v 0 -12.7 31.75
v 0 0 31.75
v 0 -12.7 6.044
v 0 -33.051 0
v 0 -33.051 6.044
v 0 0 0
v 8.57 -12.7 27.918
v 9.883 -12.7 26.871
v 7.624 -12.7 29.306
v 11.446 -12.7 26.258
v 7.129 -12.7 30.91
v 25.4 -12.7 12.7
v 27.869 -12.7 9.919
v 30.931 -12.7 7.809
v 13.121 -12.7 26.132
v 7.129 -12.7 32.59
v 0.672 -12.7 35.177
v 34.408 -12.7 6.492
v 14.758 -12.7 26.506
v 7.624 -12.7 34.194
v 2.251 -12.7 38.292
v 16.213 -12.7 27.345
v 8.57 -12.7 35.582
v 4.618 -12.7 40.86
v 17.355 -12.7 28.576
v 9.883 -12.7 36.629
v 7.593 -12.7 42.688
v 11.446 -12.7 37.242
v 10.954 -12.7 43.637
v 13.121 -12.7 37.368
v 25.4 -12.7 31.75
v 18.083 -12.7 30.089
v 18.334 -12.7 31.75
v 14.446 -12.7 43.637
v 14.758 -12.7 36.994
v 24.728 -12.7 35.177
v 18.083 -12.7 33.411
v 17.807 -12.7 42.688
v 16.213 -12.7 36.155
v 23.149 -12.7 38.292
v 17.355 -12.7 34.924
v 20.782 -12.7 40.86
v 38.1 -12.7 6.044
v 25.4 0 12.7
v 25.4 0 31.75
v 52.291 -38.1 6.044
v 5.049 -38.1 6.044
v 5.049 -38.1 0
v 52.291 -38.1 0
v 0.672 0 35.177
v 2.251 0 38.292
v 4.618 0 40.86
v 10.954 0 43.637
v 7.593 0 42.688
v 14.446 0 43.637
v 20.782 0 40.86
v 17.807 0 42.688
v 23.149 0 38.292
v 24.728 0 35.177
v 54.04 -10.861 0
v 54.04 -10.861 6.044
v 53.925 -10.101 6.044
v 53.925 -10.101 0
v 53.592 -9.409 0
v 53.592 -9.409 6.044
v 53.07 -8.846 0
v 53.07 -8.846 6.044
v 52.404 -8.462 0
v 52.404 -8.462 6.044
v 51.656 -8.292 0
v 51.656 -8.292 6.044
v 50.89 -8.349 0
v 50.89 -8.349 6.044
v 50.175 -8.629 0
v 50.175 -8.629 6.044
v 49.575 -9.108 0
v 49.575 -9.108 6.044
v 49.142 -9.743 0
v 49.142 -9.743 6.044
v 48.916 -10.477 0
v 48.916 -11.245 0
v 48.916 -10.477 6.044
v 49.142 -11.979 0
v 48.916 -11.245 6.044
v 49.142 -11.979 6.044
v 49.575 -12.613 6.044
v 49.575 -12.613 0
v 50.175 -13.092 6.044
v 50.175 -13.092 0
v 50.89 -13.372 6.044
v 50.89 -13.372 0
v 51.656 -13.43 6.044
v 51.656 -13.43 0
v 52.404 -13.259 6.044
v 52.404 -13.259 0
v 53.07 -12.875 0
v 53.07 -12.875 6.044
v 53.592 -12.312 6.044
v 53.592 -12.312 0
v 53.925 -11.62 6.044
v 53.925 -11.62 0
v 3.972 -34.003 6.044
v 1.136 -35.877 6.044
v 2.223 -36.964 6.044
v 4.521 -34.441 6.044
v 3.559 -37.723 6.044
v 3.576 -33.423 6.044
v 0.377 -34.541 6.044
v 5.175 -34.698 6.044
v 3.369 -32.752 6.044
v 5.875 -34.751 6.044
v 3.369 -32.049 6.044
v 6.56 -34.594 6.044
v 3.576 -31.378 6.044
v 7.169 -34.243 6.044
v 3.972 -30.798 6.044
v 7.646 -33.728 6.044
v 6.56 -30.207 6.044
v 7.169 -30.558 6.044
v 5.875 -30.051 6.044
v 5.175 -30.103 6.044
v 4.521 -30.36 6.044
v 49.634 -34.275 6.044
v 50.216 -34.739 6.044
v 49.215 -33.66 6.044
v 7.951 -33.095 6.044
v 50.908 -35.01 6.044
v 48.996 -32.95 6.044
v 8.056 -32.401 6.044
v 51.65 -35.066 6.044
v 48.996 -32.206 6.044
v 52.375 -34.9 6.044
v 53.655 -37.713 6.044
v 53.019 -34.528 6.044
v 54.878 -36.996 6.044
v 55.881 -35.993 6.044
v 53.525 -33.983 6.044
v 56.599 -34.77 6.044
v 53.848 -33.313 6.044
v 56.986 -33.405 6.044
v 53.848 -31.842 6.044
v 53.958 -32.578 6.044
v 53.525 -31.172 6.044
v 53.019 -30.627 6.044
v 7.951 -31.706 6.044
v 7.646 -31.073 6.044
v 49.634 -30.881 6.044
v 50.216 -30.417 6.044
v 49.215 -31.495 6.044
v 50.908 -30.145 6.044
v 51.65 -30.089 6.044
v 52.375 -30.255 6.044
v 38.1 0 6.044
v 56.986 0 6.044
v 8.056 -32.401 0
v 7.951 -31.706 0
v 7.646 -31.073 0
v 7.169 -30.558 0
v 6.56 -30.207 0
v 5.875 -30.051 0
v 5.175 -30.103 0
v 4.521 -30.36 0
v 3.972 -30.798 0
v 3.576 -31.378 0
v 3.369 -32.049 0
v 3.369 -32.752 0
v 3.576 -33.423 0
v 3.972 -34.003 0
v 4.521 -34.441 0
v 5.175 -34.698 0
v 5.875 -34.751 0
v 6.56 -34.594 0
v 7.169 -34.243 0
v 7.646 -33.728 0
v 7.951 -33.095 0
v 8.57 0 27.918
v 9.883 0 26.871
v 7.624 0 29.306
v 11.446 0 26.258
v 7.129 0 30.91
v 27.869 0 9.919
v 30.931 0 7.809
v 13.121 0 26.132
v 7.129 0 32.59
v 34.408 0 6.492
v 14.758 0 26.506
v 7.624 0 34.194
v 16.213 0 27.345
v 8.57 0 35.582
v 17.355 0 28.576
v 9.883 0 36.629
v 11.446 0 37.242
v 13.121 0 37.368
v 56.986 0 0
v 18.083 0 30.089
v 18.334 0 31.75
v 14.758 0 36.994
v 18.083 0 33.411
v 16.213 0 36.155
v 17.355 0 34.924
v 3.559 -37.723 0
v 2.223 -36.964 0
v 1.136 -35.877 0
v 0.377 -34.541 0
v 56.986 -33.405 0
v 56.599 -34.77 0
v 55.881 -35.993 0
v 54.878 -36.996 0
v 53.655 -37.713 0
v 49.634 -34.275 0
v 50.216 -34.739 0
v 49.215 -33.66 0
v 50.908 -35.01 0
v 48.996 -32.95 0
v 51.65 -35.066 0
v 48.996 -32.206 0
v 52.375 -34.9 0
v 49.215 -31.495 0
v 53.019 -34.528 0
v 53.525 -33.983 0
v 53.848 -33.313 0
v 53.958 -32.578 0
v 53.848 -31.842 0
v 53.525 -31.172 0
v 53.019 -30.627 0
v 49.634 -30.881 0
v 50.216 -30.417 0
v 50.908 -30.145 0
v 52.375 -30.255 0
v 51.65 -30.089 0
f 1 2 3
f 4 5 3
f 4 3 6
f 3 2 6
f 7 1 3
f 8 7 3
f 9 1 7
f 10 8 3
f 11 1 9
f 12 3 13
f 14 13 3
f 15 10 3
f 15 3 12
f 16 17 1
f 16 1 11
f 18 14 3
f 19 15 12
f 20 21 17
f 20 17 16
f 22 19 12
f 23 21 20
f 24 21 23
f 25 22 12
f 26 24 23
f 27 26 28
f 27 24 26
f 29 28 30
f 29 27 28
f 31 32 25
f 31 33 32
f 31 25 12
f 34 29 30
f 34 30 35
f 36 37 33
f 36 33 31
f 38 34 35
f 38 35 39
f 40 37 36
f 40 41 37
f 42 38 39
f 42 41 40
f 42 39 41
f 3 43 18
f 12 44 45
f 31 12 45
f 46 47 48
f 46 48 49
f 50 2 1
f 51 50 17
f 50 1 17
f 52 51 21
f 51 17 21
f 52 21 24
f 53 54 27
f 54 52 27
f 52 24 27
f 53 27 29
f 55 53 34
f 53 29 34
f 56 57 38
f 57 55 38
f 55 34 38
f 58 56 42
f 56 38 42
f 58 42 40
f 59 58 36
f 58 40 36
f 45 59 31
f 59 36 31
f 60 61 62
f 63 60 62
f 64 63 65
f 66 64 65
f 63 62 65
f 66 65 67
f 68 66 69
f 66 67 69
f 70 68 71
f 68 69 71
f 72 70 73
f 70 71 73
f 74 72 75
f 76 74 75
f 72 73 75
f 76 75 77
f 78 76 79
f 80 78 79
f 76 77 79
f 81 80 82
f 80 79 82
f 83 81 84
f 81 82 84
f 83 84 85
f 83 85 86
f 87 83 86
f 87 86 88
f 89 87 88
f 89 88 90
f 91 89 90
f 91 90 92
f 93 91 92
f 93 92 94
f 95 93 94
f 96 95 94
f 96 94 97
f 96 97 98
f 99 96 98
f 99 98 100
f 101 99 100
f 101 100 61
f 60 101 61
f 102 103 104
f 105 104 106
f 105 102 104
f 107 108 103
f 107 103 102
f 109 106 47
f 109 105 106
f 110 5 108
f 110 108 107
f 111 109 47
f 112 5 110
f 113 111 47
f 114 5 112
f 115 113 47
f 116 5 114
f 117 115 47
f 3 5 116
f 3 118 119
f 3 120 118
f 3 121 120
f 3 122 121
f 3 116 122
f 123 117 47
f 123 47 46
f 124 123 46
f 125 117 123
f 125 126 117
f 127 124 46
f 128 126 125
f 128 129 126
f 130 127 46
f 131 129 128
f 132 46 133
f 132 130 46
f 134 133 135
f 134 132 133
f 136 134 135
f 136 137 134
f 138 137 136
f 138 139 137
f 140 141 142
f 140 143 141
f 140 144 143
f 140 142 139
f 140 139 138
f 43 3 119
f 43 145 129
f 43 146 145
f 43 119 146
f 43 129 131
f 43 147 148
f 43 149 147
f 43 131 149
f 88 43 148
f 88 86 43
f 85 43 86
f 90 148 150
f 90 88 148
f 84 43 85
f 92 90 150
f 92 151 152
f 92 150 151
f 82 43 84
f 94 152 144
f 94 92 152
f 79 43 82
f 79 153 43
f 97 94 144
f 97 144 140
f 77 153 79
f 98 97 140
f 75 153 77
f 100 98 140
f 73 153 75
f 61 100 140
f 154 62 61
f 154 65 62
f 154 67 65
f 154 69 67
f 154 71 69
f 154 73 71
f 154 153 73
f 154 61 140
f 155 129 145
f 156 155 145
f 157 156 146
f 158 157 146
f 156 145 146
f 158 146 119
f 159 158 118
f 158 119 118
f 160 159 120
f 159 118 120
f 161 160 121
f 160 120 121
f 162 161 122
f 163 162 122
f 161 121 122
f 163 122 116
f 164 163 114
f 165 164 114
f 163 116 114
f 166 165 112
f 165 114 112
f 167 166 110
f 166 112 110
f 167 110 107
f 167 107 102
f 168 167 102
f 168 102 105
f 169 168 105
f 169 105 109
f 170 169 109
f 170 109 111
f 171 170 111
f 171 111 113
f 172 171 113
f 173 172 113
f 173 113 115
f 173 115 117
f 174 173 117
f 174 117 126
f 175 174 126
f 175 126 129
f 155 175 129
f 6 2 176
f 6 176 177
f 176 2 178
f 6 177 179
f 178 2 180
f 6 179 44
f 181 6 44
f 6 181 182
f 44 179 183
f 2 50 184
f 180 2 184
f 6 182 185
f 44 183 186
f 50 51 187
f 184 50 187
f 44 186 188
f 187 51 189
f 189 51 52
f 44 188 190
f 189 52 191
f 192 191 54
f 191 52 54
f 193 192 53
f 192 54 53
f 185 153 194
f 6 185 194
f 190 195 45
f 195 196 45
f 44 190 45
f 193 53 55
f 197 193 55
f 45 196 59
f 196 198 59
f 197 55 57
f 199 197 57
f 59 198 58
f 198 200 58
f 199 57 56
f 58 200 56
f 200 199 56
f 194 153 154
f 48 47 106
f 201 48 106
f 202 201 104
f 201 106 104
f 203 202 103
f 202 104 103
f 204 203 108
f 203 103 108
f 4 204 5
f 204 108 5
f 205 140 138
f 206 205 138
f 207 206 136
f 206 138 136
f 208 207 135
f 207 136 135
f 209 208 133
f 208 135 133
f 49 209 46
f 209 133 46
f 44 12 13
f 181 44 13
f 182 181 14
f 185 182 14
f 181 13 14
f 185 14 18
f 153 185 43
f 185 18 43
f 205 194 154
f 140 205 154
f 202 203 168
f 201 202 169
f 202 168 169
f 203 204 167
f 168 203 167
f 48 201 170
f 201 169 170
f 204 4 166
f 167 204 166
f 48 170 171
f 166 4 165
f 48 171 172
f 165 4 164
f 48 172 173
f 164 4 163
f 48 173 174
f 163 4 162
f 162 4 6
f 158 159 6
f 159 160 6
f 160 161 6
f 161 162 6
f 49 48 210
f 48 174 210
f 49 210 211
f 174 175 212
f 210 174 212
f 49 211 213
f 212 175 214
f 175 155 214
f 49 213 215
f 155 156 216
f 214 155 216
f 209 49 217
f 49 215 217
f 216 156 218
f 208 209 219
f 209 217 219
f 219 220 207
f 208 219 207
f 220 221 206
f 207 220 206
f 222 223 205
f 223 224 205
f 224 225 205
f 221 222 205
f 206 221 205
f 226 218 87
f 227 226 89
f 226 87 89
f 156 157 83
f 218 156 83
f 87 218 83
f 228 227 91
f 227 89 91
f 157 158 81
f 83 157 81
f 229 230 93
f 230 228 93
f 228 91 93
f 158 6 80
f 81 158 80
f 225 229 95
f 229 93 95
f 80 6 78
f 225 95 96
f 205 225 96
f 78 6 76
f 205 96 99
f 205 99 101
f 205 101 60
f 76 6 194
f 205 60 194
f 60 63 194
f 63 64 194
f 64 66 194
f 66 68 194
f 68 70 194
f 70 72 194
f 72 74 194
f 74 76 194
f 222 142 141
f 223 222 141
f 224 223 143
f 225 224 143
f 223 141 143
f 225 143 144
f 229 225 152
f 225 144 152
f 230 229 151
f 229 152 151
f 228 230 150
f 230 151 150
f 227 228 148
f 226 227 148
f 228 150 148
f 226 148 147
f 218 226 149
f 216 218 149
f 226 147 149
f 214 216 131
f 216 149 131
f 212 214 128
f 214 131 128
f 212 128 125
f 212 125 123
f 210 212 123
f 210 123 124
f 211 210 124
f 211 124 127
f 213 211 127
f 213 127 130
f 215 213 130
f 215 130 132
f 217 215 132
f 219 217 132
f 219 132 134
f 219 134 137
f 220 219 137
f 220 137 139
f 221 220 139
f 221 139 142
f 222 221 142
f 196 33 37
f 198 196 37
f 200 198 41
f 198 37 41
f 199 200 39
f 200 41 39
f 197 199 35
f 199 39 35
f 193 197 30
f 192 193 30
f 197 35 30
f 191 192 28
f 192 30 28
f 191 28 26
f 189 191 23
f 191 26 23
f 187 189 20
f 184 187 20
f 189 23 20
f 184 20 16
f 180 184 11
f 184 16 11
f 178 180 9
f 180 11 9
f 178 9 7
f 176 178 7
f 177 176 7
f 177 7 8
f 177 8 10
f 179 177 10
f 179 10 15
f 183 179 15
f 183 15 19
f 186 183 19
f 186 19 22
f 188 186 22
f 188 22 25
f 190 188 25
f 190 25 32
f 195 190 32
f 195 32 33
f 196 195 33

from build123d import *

# Parameters (mm, degrees)
F0_W     = 56.9855384529
F0_H     = 6.0439207591
F1_DEPTH = 38.1
F3_DEPTH = 12.7
F4_R     = 5.6337267147
F5_DEPTH = 25.4
F6_R     = 2.5763739366
F6_R_2   = 2.4951731212
F6_R_3   = 2.3565031445
F7_DEPTH = 25.4


with BuildPart() as f1:
    # F0 (on Front) → F1 (new body)
    with BuildSketch(Plane.XZ):
        with Locations((28.4927692264, 3.0219603796)):
            Rectangle(F0_W, F0_H)
    extrude(amount=F1_DEPTH)

    # F2 (on Front) → F3 (join)
    with BuildSketch(Plane.XZ):
        Polygon((0, 44.45), (0, 0), (38.1, 0), (38.1, 12.7), (25.4, 12.7), (25.4, 44.45), align=None)
    extrude(amount=F3_DEPTH)

    # F4 (on face) → F5 (cut)
    with BuildSketch(Plane.XZ.offset(12.7)):
        with BuildLine():
            ThreePointArc((0, 31.75), (12.7, 43.757902847), (25.4, 31.75))
            Line((25.4, 31.75), (25.4, 44.45))
            Line((25.4, 44.45), (0, 44.45))
            Line((0, 44.45), (0, 31.75))
        make_face()
        with Locations((12.7, 31.75)):
            Circle(F4_R)
        with BuildLine():
            Line((38.1, 12.7), (25.4, 12.7))
            ThreePointArc((25.4, 12.7), (30.9307359014, 7.8087797629), (38.1, 6.0439207591))
            Line((38.1, 6.0439207591), (38.1, 12.7))
        make_face()
    extrude(amount=-F5_DEPTH, mode=Mode.SUBTRACT)

    # F6 (on face) → F7 (cut)
    with BuildSketch(Plane.XY.offset(6.0439207591)):
        with BuildLine():
            ThreePointArc((56.9855384529, -33.4053455879), (55.411700833, -36.5261623801), (52.2908840407, -38.1))
            Line((52.2908840407, -38.1), (56.9855384529, -38.1))
            Line((56.9855384529, -38.1), (56.9855384529, -33.4053455879))
        make_face()
        with BuildLine():
            ThreePointArc((5.0487379712, -38.1), (1.6431313477, -36.4568686523), (0, -33.0512620288))
            Line((0, -33.0512620288), (0, -38.1))
            Line((0, -38.1), (5.0487379712, -38.1))
        make_face()
        with Locations((51.4632112468, -10.8606727939)):
            Circle(F6_R)
        with Locations((51.4632112468, -32.5776727939)):
            Circle(F6_R_2)
        with Locations((5.6993689856, -32.4006310144)):
            Circle(F6_R_3)
    extrude(amount=-F7_DEPTH, mode=Mode.SUBTRACT)


solid = f1.part
